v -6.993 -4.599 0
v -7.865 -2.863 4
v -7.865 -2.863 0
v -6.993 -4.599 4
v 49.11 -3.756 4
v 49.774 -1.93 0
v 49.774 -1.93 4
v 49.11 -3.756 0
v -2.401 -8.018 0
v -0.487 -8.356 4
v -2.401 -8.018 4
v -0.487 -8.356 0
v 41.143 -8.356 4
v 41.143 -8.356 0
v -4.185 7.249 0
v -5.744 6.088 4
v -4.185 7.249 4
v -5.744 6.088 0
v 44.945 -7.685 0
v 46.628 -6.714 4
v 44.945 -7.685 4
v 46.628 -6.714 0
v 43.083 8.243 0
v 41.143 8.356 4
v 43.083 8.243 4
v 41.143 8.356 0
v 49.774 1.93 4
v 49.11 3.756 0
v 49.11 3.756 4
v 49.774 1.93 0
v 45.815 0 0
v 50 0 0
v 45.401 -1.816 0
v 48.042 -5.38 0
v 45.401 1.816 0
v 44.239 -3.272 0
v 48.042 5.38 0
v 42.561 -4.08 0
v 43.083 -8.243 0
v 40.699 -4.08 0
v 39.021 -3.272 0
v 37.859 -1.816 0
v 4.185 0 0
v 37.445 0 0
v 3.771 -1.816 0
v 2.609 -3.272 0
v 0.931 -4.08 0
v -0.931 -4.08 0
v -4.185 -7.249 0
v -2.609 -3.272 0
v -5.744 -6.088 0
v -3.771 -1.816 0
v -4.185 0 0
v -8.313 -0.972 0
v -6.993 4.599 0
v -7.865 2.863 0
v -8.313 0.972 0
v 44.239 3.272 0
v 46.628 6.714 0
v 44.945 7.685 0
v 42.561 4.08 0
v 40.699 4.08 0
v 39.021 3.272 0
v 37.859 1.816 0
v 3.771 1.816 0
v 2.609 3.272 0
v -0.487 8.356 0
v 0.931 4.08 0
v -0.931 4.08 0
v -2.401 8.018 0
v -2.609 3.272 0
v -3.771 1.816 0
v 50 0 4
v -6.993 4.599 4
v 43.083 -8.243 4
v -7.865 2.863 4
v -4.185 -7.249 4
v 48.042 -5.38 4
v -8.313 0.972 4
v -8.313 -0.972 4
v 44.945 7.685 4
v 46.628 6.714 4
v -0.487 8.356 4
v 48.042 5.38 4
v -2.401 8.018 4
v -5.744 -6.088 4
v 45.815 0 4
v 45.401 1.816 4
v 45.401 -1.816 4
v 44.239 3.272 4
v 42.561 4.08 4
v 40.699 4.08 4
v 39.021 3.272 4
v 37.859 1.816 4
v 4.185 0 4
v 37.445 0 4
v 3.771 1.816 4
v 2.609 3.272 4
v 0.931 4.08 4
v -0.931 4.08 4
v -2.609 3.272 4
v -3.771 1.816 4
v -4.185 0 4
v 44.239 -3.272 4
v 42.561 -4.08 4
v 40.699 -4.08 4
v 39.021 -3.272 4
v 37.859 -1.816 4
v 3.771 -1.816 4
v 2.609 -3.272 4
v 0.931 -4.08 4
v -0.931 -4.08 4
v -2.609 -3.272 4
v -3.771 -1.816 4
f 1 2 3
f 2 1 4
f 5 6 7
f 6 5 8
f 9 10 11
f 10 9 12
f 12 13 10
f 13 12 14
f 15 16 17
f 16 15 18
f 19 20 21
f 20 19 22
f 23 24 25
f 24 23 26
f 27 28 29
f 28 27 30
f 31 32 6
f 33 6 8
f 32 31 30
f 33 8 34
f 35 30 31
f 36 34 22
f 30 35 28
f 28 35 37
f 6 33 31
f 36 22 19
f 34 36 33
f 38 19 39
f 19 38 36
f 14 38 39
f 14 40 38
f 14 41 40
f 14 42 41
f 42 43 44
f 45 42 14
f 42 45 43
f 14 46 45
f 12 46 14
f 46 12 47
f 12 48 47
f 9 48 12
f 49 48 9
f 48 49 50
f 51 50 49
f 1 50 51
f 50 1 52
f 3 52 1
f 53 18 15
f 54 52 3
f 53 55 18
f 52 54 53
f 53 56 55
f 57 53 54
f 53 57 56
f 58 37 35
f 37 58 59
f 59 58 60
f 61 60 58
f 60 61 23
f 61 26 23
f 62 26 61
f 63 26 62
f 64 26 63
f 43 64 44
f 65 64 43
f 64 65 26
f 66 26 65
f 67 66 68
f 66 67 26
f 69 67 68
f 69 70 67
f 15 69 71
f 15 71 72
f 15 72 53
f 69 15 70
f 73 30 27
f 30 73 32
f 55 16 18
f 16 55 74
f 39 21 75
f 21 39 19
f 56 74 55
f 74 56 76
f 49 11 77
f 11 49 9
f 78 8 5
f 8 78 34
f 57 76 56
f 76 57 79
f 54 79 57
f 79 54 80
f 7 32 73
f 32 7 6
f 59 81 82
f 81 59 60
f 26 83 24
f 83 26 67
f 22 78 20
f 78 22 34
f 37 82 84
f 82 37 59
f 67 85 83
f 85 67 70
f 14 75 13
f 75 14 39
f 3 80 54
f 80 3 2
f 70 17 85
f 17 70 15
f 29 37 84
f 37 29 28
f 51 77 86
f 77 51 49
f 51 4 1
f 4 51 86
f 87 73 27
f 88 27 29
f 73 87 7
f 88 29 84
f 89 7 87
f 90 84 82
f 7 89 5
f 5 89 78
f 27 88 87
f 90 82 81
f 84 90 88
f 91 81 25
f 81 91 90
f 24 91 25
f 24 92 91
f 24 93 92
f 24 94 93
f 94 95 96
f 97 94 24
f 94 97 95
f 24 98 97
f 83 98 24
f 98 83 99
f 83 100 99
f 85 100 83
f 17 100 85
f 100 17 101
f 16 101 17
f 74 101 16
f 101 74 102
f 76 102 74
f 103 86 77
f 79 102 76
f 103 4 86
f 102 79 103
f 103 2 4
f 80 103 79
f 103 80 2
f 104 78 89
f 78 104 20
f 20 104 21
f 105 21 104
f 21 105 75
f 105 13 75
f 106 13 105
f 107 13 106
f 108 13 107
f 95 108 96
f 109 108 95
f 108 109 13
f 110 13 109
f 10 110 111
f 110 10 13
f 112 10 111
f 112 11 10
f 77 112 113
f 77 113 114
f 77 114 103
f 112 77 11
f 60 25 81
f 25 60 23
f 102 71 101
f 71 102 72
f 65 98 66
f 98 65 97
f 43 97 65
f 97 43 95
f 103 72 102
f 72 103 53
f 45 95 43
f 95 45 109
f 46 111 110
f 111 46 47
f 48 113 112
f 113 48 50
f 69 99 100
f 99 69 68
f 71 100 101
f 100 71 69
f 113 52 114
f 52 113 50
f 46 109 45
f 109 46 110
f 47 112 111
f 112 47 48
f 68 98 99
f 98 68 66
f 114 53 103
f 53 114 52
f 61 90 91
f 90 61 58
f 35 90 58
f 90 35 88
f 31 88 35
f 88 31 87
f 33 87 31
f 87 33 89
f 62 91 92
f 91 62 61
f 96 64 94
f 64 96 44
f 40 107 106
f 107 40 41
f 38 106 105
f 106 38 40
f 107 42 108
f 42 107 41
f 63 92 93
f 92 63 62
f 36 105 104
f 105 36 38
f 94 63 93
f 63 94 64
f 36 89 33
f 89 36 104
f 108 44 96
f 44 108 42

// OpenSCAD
module linkage(l=50, d=8.37, h=4){
  /*
     l = length between hole centers, 
     d = hole diameter, 
     h = thickness
  */
  w = 2*d; // curved end diameter
  x = l-w/2; // y coordinate of center of second hole
  
  difference(){
    hull(){
      cylinder(h,d=w);
      translate([x,0,0]){ cylinder(h,d=w); }
    }
    cylinder(h,d=d);
    translate([x,0,0]){ cylinder(h,d=d); }
  }
}
    
linkage();
